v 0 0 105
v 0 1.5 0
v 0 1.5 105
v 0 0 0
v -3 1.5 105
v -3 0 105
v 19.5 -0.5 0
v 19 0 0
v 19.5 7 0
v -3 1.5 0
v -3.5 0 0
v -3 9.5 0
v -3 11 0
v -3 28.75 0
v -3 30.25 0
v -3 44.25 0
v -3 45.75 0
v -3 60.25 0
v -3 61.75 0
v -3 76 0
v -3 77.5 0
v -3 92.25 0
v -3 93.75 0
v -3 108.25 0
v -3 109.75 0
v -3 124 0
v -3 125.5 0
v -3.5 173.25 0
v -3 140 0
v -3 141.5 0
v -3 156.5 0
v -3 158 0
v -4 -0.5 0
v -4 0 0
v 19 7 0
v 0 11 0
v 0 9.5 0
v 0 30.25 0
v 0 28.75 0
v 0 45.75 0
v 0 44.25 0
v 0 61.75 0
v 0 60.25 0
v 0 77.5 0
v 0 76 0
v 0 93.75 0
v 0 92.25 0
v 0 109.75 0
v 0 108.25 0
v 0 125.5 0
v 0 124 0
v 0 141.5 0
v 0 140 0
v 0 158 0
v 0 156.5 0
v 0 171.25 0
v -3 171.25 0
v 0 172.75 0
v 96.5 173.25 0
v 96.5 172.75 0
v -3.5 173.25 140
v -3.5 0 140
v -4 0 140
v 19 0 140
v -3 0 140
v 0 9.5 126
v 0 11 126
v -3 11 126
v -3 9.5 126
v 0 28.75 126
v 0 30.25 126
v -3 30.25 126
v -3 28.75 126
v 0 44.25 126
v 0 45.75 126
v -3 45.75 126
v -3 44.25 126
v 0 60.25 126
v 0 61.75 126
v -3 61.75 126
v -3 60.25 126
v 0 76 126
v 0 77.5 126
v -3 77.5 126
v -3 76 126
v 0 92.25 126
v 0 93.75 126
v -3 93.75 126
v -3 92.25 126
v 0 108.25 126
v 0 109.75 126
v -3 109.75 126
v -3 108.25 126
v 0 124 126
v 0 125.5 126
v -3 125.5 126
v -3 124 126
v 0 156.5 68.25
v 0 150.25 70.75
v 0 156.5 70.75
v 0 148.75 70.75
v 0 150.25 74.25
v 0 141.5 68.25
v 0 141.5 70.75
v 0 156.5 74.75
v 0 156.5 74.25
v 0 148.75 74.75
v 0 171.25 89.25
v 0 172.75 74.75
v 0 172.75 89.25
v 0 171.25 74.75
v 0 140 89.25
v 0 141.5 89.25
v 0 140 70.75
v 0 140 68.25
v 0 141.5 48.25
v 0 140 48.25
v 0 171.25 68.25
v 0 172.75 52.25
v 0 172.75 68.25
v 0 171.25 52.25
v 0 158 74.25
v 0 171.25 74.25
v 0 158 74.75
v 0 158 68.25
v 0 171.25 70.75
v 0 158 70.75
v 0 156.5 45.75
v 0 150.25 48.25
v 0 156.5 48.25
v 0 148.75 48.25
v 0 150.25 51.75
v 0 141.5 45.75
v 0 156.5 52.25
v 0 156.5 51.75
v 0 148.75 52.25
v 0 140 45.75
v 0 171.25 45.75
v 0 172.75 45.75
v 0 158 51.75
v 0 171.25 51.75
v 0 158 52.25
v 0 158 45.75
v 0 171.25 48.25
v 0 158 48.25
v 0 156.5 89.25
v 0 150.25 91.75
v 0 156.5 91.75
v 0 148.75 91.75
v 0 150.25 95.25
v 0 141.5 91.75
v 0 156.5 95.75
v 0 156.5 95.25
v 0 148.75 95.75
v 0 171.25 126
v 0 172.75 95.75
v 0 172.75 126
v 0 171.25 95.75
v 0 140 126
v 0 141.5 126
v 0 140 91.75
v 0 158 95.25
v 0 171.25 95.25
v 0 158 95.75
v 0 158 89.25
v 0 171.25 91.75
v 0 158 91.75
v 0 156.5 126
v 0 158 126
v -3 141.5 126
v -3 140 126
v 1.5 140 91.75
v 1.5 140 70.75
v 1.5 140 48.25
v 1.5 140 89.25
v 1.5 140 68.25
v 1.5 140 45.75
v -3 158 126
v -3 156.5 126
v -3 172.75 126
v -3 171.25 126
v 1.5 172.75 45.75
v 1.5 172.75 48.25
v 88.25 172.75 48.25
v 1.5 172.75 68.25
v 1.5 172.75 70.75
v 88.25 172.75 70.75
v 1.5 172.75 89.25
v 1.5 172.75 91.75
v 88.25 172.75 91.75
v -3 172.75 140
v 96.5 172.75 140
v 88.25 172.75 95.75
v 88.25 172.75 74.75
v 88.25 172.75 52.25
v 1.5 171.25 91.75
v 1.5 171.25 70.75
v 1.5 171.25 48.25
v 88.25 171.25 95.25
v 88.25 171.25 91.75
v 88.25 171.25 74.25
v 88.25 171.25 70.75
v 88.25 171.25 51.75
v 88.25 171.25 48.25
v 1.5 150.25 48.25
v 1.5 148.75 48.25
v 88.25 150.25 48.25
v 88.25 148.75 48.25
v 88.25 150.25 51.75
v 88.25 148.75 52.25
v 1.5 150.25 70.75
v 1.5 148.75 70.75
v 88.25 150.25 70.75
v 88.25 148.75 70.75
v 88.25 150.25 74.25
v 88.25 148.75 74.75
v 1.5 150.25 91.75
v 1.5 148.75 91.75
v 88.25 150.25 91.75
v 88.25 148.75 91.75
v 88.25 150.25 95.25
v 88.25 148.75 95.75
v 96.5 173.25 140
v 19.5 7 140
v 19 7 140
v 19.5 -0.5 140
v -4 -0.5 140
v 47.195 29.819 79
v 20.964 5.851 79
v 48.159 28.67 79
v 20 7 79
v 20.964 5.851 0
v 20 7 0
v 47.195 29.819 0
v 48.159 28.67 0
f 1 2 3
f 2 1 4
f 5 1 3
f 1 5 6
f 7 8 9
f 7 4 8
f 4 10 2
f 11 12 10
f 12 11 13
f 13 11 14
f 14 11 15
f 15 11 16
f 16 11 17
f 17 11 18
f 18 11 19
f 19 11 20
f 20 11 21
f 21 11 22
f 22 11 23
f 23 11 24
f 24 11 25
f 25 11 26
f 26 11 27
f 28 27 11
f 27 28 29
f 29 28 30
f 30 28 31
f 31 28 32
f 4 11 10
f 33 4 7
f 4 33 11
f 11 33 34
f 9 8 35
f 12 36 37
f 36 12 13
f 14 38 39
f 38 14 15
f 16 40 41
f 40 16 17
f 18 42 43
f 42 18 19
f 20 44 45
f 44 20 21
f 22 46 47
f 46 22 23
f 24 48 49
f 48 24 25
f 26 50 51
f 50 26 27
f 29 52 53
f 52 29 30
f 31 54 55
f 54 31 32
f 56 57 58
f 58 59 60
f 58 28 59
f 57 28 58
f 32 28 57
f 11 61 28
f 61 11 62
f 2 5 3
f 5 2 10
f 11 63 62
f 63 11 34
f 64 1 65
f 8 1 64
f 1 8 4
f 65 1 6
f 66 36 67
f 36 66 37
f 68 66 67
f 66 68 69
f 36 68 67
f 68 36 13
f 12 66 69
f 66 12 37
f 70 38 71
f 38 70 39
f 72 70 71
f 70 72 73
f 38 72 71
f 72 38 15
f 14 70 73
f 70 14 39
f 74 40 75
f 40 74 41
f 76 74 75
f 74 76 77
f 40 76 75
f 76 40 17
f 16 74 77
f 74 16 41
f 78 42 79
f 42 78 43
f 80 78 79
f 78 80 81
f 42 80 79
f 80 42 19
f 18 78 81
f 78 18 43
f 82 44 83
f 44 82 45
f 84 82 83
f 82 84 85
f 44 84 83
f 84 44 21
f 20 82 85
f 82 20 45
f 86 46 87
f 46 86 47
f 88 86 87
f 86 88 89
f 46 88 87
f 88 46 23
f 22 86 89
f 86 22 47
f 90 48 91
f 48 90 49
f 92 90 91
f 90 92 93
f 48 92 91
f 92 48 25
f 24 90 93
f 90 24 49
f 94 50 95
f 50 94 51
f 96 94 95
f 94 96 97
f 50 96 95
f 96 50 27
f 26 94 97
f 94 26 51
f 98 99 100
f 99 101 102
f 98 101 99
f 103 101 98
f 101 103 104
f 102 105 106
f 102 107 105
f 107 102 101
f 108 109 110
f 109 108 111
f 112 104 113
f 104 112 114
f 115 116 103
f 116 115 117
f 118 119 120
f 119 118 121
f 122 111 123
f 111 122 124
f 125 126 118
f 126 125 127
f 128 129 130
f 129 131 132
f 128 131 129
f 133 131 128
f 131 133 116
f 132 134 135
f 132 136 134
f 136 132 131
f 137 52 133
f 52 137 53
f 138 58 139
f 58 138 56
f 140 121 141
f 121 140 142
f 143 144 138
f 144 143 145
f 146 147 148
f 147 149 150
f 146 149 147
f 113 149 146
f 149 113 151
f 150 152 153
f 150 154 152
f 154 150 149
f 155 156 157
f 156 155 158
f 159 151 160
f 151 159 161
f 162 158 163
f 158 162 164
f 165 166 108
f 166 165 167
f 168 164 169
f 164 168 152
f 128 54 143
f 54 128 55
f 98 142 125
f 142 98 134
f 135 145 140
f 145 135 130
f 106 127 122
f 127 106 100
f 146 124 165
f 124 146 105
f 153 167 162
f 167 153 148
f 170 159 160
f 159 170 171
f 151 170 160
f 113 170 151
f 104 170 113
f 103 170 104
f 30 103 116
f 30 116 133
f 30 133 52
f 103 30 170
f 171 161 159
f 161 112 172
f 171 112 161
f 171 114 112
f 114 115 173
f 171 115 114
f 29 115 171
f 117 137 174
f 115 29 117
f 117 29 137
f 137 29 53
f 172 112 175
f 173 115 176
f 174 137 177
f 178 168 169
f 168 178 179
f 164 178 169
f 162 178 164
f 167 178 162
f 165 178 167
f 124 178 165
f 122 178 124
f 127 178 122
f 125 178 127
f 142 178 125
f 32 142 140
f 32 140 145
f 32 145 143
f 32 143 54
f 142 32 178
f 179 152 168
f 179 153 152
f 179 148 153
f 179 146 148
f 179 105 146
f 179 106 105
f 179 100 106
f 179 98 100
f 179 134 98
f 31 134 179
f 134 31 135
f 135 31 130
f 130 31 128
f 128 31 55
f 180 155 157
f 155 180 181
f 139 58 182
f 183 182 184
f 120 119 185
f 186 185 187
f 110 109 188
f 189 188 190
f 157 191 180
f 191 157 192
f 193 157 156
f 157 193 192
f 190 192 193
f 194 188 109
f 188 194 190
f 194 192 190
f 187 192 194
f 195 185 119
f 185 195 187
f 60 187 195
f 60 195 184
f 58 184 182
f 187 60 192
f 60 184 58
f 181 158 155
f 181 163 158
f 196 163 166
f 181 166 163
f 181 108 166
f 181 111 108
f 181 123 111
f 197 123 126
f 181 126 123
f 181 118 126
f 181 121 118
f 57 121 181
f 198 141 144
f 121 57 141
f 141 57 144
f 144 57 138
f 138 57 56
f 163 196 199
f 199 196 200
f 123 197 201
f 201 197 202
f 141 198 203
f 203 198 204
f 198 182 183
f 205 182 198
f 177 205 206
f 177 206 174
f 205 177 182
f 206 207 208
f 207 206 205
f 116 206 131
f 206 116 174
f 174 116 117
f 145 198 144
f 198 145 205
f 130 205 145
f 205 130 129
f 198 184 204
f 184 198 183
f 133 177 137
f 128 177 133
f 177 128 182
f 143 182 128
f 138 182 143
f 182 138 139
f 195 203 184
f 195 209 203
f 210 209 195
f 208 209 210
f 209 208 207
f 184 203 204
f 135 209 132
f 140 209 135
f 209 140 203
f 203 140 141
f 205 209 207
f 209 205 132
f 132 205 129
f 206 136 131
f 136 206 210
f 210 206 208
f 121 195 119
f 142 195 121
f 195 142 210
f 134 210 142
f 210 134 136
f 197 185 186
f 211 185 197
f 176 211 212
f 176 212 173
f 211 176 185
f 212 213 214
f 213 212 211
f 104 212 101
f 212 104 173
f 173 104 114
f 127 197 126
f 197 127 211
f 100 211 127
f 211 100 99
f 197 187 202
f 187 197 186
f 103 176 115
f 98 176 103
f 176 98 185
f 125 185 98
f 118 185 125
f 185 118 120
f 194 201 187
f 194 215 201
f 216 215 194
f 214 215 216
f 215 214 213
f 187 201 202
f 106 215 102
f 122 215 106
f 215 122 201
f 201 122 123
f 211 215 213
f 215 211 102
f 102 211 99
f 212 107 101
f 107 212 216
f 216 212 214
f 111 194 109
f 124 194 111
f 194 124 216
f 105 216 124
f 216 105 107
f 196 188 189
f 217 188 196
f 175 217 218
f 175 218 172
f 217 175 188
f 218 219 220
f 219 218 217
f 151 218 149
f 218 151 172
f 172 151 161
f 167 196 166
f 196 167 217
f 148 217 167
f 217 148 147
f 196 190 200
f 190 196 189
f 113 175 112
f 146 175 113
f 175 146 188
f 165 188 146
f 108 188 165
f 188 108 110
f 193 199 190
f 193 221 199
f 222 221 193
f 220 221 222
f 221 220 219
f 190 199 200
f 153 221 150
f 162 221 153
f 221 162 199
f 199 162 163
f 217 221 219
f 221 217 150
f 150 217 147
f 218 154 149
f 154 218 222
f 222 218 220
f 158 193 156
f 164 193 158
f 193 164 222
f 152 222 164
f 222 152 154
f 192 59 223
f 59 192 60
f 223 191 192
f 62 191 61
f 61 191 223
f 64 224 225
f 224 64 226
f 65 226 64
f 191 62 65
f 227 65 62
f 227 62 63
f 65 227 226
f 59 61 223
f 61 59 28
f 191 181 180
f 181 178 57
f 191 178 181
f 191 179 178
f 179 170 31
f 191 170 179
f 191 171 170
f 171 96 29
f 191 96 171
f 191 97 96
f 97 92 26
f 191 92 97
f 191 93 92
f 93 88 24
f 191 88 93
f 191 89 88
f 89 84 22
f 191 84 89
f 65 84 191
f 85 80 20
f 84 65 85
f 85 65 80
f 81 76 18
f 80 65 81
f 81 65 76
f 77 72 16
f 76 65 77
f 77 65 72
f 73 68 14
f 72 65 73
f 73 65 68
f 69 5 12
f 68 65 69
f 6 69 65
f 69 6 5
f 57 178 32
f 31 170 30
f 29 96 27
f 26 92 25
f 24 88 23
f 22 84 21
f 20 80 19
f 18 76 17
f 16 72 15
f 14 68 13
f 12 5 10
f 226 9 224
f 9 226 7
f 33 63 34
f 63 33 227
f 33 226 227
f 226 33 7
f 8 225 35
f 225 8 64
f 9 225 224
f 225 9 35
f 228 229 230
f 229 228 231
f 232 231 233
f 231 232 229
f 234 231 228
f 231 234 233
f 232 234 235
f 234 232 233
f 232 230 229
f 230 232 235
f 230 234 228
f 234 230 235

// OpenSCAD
room_width = 172.75; // Not measured, inferred from 10 measurements below. If I had to guess, +/- 2" error

translate([-3.5, 0, 0]){
    cube([3.5, 1.5, 105]);
    S(9.5);
    S(28.75);
    S(44.25);
    S(60.25);
    S(76);
    S(92.25);
    S(108.25);
    S(124);
    S(140);
    S(156.5);
    S(171.25);
}
Shelf(45.75);
Shelf(68.25);
Shelf(89.25);

color("grey")
translate([-3.5, room_width, 0])
    cube([100, 0.5, 140]);
color("grey")
translate([-3.5, 0, 0,])
    cube([0.5, room_width + 0.5, 140]);
color("grey")
translate([-4, -0.5, 0])
    cube([23.5, 0.5, 140]);
color("grey")
translate([19, -0.5, 0])
    cube([0.5, 7.5, 140]);


// Door
translate([20, 7, 0])
    rotate([0, 0, 40])
    translate([0, -1.5, 0])
    cube([35.5, 1.5, 79]);


module S(d) {
    translate([0, d, 0])
        cube([3.5, 1.5, 126]);
}

module Shelf(h) {
    translate([0, room_width - 32.75, h])
        cube([1.5, 32.75, 2.5]);
    translate([0, room_width - 24, h + 2.5])
        cube([88.25, 1.5, 3.5]);
    translate([0, room_width - 1.5, h + 2.5])
        cube([88.25, 1.5, 3.5]);
    translate([0, room_width - 24, h + 6])
        cube([88.25, 24, 0.5]);
}
